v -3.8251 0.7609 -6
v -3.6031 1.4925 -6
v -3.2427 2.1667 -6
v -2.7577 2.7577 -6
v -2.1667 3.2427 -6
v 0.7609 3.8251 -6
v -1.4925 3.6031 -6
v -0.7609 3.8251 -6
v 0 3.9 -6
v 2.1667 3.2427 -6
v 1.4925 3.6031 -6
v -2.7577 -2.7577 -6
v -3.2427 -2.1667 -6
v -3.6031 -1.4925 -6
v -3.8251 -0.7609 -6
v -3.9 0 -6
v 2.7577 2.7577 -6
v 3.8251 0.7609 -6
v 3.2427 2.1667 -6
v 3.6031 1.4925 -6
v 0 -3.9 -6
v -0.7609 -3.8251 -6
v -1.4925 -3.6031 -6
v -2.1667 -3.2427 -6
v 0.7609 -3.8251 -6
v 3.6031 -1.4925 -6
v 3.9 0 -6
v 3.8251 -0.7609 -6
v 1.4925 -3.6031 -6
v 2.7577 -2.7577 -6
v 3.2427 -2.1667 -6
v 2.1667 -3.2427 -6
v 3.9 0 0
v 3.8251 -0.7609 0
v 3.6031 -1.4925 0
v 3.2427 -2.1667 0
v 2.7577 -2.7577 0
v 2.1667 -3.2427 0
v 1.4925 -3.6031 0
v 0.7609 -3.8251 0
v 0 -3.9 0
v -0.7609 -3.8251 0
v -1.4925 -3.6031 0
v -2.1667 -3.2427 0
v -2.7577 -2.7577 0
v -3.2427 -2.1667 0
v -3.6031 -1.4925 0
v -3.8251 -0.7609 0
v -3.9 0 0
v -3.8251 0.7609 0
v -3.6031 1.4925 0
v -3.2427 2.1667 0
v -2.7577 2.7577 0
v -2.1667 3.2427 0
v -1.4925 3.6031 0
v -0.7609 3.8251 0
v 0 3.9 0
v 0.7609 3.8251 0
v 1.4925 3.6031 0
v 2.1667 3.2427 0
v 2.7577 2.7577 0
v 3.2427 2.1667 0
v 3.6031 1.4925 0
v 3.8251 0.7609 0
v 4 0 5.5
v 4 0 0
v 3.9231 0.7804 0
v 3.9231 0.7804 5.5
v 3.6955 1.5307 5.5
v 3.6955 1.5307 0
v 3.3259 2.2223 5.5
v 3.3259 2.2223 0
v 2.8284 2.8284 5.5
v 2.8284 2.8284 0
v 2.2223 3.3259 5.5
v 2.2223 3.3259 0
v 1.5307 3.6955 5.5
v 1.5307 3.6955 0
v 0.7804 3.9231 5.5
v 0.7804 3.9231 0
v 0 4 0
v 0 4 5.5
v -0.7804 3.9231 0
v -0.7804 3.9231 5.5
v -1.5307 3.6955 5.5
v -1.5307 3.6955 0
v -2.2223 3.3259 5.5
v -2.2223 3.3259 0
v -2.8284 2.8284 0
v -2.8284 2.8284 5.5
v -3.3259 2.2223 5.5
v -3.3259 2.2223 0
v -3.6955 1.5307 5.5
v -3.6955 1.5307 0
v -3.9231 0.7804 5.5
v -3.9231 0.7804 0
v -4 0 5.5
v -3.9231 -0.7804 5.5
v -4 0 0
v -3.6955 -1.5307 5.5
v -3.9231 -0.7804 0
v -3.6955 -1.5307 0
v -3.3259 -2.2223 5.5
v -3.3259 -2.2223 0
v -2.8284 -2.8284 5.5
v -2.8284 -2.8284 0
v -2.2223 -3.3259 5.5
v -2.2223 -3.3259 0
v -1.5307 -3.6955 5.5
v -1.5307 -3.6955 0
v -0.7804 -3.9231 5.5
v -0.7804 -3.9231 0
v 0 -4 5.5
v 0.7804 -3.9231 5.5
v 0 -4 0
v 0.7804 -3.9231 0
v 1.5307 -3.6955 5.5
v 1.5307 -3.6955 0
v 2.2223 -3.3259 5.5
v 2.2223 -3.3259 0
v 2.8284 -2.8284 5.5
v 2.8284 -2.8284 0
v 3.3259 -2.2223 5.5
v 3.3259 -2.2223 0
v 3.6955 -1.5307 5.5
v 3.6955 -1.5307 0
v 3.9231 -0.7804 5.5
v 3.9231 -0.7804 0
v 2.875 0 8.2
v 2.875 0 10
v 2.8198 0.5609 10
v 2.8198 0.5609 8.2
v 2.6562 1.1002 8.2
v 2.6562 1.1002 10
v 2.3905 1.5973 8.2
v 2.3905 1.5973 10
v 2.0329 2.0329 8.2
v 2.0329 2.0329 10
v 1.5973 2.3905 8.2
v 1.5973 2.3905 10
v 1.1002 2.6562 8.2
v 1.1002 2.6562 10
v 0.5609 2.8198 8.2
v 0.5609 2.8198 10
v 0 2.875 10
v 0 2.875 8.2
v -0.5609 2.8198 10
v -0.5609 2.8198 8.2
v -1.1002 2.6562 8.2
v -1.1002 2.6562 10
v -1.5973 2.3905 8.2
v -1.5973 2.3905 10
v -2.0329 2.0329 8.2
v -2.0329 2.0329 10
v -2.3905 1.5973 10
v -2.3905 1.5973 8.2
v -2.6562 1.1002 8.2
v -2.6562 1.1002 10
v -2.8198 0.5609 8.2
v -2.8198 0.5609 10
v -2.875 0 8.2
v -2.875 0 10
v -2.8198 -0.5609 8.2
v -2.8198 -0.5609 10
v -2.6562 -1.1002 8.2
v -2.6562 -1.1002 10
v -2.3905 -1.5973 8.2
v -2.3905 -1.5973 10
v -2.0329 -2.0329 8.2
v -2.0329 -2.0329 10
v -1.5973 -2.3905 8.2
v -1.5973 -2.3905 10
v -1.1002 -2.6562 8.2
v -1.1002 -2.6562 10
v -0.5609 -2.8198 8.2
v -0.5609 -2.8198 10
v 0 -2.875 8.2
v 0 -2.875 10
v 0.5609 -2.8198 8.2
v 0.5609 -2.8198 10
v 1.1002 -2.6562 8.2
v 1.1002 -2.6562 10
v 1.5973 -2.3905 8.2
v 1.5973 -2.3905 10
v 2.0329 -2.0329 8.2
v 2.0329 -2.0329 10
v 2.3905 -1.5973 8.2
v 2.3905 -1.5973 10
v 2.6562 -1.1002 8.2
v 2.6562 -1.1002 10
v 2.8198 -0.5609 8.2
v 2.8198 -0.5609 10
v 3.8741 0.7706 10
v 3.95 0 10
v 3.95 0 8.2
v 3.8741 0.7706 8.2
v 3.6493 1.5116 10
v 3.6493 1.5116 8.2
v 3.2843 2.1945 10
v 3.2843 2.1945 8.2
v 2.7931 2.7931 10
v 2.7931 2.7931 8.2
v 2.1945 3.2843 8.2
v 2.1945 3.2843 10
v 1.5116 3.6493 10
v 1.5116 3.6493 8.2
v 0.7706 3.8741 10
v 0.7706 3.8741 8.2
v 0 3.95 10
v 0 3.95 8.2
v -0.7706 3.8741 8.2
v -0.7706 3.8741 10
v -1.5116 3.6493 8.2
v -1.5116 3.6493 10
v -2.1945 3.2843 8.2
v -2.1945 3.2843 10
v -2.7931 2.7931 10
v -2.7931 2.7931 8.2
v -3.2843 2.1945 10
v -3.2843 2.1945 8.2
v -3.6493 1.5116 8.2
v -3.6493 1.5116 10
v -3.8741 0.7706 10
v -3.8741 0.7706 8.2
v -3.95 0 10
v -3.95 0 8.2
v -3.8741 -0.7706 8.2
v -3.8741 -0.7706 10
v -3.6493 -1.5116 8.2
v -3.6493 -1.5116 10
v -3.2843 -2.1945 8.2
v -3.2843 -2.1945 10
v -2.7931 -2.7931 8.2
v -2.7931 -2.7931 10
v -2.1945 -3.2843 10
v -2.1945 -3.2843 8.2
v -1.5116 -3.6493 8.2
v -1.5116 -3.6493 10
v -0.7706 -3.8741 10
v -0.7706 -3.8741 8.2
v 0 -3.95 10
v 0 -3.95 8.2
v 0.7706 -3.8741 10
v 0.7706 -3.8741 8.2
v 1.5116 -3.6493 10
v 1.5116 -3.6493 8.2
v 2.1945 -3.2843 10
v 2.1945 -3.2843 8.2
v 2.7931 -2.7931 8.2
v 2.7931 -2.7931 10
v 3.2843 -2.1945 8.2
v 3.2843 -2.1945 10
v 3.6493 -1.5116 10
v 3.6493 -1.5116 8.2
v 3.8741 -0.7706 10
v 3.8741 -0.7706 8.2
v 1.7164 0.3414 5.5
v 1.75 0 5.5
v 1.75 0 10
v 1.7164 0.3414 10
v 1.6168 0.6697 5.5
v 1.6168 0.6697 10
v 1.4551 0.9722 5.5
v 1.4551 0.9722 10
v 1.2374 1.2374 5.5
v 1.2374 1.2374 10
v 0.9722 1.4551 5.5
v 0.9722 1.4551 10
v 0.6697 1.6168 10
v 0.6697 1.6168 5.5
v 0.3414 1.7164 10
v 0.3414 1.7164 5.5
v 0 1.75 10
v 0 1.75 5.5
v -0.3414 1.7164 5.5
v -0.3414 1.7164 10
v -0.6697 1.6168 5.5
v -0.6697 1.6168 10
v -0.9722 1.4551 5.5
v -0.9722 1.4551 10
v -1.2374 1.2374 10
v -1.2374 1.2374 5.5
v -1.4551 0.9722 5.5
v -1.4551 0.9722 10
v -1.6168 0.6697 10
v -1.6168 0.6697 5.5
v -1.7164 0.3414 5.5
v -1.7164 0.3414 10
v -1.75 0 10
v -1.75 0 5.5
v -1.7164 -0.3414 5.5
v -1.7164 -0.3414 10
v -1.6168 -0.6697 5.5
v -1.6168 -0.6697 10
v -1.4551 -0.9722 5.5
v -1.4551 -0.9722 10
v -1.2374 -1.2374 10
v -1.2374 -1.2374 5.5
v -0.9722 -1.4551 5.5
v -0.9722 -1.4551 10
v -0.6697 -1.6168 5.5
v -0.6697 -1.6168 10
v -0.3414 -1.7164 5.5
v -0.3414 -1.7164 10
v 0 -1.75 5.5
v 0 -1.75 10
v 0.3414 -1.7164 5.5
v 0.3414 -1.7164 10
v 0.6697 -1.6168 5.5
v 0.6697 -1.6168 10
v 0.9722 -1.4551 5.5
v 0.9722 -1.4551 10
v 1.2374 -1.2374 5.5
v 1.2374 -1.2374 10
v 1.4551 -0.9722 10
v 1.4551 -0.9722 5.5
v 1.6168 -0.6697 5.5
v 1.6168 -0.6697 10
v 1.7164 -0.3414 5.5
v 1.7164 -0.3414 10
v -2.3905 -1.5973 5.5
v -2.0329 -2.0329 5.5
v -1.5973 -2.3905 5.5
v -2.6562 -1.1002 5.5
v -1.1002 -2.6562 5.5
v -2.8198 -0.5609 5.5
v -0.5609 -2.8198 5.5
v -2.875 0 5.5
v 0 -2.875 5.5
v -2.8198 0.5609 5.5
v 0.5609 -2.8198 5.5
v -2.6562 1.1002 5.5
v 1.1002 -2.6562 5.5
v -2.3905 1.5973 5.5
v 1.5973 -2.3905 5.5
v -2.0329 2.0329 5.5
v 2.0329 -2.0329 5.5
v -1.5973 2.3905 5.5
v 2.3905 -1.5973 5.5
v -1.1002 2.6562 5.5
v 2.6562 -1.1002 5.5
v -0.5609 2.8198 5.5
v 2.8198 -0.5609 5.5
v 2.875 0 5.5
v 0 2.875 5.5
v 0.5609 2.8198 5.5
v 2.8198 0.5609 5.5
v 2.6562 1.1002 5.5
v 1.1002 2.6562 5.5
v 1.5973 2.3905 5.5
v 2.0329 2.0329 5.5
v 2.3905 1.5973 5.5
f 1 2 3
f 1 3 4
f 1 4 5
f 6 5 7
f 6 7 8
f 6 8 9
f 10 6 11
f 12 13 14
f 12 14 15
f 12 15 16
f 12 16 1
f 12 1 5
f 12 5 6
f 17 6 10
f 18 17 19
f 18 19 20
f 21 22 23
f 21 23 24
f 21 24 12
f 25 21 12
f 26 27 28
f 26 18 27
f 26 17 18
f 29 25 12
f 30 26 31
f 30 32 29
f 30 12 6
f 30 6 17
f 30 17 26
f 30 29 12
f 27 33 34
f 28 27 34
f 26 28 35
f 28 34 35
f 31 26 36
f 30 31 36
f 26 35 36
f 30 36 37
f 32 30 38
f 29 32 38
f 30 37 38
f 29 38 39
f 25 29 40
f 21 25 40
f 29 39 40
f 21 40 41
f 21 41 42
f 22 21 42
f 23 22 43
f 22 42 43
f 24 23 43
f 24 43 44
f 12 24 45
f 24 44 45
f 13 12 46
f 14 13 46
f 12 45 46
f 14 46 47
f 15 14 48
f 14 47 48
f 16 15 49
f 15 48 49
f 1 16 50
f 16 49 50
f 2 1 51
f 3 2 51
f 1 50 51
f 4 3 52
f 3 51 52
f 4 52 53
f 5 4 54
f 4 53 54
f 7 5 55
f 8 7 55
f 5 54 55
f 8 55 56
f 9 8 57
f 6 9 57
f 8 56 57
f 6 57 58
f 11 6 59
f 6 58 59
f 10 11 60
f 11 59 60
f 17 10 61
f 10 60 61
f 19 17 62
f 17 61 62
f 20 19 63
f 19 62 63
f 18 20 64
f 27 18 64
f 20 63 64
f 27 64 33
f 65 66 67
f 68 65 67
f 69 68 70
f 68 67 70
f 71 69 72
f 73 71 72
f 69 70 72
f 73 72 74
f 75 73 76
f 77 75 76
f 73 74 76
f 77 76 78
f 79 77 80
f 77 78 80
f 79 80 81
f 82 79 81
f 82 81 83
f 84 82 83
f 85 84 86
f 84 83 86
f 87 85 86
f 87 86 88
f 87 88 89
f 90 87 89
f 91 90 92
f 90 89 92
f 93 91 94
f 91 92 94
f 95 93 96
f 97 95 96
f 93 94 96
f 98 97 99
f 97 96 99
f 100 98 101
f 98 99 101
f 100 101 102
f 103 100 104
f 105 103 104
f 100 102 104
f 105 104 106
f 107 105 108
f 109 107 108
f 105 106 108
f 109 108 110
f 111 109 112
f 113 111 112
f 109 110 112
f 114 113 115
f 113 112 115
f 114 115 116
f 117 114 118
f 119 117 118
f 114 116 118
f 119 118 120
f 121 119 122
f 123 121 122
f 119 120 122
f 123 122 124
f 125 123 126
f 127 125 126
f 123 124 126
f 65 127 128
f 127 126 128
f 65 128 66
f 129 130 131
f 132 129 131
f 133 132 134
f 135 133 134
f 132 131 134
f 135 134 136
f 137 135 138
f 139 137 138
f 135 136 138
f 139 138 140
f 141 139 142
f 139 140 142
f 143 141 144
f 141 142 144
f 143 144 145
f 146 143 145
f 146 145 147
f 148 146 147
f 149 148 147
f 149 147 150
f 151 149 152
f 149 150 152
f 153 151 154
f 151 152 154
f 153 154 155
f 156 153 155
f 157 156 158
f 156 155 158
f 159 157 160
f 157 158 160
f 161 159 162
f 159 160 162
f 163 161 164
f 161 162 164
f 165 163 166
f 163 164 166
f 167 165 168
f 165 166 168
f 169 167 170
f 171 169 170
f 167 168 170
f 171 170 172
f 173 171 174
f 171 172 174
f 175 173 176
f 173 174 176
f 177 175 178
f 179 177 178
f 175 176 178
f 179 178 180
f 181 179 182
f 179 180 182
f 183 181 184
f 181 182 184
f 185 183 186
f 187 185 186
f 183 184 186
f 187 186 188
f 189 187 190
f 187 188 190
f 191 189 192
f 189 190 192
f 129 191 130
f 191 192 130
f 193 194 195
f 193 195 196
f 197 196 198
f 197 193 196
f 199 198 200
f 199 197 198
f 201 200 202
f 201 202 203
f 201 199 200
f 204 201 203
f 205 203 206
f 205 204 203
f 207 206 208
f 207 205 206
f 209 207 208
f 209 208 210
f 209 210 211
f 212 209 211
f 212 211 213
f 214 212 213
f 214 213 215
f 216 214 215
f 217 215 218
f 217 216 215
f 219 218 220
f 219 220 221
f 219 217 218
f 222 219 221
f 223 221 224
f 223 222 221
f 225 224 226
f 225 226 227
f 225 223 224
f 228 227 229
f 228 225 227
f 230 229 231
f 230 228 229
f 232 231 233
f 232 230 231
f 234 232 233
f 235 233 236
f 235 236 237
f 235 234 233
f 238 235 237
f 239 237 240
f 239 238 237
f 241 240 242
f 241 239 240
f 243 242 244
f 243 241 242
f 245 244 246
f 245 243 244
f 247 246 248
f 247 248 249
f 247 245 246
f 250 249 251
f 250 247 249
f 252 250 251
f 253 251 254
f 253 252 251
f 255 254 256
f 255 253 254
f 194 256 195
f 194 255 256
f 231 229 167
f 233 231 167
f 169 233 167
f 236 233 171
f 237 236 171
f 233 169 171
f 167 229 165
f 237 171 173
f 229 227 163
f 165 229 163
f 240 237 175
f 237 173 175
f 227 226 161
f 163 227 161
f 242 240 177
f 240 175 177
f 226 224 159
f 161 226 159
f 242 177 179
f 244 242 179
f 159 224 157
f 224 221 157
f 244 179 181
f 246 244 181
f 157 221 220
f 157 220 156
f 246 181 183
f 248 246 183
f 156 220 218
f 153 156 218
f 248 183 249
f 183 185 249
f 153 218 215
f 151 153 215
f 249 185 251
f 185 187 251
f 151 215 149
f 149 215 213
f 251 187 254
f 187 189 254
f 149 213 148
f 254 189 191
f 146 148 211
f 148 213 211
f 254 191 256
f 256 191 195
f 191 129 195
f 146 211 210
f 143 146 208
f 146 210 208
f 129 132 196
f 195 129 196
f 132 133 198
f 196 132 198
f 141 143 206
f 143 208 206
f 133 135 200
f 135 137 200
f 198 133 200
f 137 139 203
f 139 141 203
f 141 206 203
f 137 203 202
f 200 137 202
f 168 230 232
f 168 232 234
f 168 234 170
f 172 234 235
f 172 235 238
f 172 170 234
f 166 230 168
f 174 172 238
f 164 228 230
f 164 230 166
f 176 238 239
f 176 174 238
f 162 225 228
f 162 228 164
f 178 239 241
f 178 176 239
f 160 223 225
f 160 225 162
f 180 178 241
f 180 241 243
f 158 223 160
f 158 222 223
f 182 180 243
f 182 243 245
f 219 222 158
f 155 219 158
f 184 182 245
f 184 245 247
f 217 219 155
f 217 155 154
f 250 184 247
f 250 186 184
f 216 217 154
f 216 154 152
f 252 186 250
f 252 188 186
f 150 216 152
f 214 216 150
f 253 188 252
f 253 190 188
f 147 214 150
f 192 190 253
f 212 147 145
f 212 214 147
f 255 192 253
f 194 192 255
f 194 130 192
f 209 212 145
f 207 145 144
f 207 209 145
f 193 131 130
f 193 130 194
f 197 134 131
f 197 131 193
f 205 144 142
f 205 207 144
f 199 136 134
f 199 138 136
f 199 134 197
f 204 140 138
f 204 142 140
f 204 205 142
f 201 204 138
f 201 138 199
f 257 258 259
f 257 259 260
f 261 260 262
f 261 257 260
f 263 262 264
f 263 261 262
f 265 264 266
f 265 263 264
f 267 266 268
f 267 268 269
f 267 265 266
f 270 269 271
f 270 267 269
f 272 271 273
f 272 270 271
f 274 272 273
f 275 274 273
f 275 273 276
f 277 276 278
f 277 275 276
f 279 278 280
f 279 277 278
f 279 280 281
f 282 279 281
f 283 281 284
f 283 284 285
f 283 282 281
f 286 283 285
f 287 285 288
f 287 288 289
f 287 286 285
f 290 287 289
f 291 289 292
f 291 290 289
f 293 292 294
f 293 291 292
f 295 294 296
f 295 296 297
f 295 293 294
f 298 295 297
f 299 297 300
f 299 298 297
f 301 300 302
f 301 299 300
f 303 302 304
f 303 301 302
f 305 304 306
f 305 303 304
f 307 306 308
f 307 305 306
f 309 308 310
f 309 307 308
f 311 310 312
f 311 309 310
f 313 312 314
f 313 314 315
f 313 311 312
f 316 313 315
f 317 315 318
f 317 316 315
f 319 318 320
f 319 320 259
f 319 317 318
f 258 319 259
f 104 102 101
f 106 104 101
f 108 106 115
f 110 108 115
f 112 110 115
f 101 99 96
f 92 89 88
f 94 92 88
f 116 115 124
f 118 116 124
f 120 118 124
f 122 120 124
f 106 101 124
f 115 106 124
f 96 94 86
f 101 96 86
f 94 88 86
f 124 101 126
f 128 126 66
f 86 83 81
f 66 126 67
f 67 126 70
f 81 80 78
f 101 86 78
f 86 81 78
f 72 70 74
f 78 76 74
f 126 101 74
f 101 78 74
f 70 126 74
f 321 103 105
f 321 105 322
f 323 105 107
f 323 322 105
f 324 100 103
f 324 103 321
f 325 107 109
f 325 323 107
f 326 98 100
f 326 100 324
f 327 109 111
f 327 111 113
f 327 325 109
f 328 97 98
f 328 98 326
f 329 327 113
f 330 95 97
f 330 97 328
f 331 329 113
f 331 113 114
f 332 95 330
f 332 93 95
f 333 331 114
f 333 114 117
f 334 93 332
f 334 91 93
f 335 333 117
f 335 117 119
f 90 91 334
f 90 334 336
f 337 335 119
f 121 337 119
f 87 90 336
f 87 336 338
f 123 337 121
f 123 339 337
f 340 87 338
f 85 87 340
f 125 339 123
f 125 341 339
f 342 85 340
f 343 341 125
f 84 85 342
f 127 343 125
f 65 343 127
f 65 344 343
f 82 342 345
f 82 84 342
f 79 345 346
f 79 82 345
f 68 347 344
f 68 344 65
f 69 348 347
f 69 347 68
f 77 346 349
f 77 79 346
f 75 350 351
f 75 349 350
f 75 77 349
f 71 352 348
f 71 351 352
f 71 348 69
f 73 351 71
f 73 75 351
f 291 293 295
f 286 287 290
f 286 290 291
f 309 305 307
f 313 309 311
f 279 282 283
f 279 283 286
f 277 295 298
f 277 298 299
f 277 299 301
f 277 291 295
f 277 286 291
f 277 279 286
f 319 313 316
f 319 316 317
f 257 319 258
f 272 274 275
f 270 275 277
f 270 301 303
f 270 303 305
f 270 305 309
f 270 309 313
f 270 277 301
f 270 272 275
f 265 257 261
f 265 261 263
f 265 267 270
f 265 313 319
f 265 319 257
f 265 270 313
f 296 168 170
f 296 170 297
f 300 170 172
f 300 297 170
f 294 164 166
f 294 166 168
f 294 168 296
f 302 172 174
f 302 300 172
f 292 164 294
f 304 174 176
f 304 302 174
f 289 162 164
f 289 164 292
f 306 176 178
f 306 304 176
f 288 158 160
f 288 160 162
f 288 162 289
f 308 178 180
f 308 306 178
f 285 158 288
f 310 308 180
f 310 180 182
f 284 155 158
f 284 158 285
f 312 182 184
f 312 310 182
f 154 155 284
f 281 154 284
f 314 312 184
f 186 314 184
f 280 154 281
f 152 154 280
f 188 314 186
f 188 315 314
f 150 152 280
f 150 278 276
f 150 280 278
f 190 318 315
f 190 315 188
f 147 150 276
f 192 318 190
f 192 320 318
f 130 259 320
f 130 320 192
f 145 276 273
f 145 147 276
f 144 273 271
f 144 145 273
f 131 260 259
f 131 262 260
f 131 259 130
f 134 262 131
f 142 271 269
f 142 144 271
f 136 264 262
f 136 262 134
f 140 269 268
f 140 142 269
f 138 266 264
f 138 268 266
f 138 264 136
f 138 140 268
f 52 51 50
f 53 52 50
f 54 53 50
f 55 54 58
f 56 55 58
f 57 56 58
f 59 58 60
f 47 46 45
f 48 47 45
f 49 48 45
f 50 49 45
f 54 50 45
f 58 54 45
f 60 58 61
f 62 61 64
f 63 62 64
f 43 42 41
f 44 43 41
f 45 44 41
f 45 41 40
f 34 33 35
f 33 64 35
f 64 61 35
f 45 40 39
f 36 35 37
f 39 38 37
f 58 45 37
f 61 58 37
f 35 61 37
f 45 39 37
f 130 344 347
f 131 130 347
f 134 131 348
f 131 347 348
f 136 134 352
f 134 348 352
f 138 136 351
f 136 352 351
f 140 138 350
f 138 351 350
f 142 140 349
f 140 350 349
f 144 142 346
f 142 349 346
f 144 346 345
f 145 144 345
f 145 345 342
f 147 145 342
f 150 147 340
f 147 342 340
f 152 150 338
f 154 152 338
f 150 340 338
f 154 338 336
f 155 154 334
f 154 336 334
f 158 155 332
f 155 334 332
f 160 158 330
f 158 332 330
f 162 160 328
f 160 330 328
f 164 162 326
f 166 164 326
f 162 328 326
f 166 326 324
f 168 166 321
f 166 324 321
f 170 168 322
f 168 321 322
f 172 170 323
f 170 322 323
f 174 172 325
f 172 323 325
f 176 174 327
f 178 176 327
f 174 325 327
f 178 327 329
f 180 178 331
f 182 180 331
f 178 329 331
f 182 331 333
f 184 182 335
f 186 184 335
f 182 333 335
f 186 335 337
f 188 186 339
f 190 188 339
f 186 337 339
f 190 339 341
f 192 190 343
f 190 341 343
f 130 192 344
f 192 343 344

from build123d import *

# Parameters (mm, degrees)
F0_R     = 4
F1_DEPTH = 5.5
F2_R     = 3.9
F3_DEPTH = 6
F4_R     = 2.875
F4_R_2   = 1.75
F5_DEPTH = 4.5
F6_R     = 3.95
F6_R_2   = 2.875
F7_DEPTH = 1.8


with BuildPart() as f1:
    # F0 (on Top) → F1 (new body)
    with BuildSketch(Plane.XY):
        Circle(F0_R)
    extrude(amount=F1_DEPTH)

    # F4 (on face) → F5 (join)
    with BuildSketch(Plane.XY.offset(5.5)):
        Circle(F4_R)
        Circle(F4_R_2, mode=Mode.SUBTRACT)
    extrude(amount=F5_DEPTH)


with BuildPart() as f3:
    # F2 (on face) → F3 (new body)
    with BuildSketch(Plane(origin=(0, 0, 0), x_dir=(1, 0, 0), z_dir=(0, 0, -1))):
        Circle(F2_R)
    extrude(amount=F3_DEPTH)


with BuildPart() as f7:
    # F6 (on face) → F7 (new body)
    with BuildSketch(Plane.XY.offset(10)):
        Circle(F6_R)
        Circle(F6_R_2, mode=Mode.SUBTRACT)
    extrude(amount=-F7_DEPTH)


solid = Compound([f1.part, f3.part, f7.part])
